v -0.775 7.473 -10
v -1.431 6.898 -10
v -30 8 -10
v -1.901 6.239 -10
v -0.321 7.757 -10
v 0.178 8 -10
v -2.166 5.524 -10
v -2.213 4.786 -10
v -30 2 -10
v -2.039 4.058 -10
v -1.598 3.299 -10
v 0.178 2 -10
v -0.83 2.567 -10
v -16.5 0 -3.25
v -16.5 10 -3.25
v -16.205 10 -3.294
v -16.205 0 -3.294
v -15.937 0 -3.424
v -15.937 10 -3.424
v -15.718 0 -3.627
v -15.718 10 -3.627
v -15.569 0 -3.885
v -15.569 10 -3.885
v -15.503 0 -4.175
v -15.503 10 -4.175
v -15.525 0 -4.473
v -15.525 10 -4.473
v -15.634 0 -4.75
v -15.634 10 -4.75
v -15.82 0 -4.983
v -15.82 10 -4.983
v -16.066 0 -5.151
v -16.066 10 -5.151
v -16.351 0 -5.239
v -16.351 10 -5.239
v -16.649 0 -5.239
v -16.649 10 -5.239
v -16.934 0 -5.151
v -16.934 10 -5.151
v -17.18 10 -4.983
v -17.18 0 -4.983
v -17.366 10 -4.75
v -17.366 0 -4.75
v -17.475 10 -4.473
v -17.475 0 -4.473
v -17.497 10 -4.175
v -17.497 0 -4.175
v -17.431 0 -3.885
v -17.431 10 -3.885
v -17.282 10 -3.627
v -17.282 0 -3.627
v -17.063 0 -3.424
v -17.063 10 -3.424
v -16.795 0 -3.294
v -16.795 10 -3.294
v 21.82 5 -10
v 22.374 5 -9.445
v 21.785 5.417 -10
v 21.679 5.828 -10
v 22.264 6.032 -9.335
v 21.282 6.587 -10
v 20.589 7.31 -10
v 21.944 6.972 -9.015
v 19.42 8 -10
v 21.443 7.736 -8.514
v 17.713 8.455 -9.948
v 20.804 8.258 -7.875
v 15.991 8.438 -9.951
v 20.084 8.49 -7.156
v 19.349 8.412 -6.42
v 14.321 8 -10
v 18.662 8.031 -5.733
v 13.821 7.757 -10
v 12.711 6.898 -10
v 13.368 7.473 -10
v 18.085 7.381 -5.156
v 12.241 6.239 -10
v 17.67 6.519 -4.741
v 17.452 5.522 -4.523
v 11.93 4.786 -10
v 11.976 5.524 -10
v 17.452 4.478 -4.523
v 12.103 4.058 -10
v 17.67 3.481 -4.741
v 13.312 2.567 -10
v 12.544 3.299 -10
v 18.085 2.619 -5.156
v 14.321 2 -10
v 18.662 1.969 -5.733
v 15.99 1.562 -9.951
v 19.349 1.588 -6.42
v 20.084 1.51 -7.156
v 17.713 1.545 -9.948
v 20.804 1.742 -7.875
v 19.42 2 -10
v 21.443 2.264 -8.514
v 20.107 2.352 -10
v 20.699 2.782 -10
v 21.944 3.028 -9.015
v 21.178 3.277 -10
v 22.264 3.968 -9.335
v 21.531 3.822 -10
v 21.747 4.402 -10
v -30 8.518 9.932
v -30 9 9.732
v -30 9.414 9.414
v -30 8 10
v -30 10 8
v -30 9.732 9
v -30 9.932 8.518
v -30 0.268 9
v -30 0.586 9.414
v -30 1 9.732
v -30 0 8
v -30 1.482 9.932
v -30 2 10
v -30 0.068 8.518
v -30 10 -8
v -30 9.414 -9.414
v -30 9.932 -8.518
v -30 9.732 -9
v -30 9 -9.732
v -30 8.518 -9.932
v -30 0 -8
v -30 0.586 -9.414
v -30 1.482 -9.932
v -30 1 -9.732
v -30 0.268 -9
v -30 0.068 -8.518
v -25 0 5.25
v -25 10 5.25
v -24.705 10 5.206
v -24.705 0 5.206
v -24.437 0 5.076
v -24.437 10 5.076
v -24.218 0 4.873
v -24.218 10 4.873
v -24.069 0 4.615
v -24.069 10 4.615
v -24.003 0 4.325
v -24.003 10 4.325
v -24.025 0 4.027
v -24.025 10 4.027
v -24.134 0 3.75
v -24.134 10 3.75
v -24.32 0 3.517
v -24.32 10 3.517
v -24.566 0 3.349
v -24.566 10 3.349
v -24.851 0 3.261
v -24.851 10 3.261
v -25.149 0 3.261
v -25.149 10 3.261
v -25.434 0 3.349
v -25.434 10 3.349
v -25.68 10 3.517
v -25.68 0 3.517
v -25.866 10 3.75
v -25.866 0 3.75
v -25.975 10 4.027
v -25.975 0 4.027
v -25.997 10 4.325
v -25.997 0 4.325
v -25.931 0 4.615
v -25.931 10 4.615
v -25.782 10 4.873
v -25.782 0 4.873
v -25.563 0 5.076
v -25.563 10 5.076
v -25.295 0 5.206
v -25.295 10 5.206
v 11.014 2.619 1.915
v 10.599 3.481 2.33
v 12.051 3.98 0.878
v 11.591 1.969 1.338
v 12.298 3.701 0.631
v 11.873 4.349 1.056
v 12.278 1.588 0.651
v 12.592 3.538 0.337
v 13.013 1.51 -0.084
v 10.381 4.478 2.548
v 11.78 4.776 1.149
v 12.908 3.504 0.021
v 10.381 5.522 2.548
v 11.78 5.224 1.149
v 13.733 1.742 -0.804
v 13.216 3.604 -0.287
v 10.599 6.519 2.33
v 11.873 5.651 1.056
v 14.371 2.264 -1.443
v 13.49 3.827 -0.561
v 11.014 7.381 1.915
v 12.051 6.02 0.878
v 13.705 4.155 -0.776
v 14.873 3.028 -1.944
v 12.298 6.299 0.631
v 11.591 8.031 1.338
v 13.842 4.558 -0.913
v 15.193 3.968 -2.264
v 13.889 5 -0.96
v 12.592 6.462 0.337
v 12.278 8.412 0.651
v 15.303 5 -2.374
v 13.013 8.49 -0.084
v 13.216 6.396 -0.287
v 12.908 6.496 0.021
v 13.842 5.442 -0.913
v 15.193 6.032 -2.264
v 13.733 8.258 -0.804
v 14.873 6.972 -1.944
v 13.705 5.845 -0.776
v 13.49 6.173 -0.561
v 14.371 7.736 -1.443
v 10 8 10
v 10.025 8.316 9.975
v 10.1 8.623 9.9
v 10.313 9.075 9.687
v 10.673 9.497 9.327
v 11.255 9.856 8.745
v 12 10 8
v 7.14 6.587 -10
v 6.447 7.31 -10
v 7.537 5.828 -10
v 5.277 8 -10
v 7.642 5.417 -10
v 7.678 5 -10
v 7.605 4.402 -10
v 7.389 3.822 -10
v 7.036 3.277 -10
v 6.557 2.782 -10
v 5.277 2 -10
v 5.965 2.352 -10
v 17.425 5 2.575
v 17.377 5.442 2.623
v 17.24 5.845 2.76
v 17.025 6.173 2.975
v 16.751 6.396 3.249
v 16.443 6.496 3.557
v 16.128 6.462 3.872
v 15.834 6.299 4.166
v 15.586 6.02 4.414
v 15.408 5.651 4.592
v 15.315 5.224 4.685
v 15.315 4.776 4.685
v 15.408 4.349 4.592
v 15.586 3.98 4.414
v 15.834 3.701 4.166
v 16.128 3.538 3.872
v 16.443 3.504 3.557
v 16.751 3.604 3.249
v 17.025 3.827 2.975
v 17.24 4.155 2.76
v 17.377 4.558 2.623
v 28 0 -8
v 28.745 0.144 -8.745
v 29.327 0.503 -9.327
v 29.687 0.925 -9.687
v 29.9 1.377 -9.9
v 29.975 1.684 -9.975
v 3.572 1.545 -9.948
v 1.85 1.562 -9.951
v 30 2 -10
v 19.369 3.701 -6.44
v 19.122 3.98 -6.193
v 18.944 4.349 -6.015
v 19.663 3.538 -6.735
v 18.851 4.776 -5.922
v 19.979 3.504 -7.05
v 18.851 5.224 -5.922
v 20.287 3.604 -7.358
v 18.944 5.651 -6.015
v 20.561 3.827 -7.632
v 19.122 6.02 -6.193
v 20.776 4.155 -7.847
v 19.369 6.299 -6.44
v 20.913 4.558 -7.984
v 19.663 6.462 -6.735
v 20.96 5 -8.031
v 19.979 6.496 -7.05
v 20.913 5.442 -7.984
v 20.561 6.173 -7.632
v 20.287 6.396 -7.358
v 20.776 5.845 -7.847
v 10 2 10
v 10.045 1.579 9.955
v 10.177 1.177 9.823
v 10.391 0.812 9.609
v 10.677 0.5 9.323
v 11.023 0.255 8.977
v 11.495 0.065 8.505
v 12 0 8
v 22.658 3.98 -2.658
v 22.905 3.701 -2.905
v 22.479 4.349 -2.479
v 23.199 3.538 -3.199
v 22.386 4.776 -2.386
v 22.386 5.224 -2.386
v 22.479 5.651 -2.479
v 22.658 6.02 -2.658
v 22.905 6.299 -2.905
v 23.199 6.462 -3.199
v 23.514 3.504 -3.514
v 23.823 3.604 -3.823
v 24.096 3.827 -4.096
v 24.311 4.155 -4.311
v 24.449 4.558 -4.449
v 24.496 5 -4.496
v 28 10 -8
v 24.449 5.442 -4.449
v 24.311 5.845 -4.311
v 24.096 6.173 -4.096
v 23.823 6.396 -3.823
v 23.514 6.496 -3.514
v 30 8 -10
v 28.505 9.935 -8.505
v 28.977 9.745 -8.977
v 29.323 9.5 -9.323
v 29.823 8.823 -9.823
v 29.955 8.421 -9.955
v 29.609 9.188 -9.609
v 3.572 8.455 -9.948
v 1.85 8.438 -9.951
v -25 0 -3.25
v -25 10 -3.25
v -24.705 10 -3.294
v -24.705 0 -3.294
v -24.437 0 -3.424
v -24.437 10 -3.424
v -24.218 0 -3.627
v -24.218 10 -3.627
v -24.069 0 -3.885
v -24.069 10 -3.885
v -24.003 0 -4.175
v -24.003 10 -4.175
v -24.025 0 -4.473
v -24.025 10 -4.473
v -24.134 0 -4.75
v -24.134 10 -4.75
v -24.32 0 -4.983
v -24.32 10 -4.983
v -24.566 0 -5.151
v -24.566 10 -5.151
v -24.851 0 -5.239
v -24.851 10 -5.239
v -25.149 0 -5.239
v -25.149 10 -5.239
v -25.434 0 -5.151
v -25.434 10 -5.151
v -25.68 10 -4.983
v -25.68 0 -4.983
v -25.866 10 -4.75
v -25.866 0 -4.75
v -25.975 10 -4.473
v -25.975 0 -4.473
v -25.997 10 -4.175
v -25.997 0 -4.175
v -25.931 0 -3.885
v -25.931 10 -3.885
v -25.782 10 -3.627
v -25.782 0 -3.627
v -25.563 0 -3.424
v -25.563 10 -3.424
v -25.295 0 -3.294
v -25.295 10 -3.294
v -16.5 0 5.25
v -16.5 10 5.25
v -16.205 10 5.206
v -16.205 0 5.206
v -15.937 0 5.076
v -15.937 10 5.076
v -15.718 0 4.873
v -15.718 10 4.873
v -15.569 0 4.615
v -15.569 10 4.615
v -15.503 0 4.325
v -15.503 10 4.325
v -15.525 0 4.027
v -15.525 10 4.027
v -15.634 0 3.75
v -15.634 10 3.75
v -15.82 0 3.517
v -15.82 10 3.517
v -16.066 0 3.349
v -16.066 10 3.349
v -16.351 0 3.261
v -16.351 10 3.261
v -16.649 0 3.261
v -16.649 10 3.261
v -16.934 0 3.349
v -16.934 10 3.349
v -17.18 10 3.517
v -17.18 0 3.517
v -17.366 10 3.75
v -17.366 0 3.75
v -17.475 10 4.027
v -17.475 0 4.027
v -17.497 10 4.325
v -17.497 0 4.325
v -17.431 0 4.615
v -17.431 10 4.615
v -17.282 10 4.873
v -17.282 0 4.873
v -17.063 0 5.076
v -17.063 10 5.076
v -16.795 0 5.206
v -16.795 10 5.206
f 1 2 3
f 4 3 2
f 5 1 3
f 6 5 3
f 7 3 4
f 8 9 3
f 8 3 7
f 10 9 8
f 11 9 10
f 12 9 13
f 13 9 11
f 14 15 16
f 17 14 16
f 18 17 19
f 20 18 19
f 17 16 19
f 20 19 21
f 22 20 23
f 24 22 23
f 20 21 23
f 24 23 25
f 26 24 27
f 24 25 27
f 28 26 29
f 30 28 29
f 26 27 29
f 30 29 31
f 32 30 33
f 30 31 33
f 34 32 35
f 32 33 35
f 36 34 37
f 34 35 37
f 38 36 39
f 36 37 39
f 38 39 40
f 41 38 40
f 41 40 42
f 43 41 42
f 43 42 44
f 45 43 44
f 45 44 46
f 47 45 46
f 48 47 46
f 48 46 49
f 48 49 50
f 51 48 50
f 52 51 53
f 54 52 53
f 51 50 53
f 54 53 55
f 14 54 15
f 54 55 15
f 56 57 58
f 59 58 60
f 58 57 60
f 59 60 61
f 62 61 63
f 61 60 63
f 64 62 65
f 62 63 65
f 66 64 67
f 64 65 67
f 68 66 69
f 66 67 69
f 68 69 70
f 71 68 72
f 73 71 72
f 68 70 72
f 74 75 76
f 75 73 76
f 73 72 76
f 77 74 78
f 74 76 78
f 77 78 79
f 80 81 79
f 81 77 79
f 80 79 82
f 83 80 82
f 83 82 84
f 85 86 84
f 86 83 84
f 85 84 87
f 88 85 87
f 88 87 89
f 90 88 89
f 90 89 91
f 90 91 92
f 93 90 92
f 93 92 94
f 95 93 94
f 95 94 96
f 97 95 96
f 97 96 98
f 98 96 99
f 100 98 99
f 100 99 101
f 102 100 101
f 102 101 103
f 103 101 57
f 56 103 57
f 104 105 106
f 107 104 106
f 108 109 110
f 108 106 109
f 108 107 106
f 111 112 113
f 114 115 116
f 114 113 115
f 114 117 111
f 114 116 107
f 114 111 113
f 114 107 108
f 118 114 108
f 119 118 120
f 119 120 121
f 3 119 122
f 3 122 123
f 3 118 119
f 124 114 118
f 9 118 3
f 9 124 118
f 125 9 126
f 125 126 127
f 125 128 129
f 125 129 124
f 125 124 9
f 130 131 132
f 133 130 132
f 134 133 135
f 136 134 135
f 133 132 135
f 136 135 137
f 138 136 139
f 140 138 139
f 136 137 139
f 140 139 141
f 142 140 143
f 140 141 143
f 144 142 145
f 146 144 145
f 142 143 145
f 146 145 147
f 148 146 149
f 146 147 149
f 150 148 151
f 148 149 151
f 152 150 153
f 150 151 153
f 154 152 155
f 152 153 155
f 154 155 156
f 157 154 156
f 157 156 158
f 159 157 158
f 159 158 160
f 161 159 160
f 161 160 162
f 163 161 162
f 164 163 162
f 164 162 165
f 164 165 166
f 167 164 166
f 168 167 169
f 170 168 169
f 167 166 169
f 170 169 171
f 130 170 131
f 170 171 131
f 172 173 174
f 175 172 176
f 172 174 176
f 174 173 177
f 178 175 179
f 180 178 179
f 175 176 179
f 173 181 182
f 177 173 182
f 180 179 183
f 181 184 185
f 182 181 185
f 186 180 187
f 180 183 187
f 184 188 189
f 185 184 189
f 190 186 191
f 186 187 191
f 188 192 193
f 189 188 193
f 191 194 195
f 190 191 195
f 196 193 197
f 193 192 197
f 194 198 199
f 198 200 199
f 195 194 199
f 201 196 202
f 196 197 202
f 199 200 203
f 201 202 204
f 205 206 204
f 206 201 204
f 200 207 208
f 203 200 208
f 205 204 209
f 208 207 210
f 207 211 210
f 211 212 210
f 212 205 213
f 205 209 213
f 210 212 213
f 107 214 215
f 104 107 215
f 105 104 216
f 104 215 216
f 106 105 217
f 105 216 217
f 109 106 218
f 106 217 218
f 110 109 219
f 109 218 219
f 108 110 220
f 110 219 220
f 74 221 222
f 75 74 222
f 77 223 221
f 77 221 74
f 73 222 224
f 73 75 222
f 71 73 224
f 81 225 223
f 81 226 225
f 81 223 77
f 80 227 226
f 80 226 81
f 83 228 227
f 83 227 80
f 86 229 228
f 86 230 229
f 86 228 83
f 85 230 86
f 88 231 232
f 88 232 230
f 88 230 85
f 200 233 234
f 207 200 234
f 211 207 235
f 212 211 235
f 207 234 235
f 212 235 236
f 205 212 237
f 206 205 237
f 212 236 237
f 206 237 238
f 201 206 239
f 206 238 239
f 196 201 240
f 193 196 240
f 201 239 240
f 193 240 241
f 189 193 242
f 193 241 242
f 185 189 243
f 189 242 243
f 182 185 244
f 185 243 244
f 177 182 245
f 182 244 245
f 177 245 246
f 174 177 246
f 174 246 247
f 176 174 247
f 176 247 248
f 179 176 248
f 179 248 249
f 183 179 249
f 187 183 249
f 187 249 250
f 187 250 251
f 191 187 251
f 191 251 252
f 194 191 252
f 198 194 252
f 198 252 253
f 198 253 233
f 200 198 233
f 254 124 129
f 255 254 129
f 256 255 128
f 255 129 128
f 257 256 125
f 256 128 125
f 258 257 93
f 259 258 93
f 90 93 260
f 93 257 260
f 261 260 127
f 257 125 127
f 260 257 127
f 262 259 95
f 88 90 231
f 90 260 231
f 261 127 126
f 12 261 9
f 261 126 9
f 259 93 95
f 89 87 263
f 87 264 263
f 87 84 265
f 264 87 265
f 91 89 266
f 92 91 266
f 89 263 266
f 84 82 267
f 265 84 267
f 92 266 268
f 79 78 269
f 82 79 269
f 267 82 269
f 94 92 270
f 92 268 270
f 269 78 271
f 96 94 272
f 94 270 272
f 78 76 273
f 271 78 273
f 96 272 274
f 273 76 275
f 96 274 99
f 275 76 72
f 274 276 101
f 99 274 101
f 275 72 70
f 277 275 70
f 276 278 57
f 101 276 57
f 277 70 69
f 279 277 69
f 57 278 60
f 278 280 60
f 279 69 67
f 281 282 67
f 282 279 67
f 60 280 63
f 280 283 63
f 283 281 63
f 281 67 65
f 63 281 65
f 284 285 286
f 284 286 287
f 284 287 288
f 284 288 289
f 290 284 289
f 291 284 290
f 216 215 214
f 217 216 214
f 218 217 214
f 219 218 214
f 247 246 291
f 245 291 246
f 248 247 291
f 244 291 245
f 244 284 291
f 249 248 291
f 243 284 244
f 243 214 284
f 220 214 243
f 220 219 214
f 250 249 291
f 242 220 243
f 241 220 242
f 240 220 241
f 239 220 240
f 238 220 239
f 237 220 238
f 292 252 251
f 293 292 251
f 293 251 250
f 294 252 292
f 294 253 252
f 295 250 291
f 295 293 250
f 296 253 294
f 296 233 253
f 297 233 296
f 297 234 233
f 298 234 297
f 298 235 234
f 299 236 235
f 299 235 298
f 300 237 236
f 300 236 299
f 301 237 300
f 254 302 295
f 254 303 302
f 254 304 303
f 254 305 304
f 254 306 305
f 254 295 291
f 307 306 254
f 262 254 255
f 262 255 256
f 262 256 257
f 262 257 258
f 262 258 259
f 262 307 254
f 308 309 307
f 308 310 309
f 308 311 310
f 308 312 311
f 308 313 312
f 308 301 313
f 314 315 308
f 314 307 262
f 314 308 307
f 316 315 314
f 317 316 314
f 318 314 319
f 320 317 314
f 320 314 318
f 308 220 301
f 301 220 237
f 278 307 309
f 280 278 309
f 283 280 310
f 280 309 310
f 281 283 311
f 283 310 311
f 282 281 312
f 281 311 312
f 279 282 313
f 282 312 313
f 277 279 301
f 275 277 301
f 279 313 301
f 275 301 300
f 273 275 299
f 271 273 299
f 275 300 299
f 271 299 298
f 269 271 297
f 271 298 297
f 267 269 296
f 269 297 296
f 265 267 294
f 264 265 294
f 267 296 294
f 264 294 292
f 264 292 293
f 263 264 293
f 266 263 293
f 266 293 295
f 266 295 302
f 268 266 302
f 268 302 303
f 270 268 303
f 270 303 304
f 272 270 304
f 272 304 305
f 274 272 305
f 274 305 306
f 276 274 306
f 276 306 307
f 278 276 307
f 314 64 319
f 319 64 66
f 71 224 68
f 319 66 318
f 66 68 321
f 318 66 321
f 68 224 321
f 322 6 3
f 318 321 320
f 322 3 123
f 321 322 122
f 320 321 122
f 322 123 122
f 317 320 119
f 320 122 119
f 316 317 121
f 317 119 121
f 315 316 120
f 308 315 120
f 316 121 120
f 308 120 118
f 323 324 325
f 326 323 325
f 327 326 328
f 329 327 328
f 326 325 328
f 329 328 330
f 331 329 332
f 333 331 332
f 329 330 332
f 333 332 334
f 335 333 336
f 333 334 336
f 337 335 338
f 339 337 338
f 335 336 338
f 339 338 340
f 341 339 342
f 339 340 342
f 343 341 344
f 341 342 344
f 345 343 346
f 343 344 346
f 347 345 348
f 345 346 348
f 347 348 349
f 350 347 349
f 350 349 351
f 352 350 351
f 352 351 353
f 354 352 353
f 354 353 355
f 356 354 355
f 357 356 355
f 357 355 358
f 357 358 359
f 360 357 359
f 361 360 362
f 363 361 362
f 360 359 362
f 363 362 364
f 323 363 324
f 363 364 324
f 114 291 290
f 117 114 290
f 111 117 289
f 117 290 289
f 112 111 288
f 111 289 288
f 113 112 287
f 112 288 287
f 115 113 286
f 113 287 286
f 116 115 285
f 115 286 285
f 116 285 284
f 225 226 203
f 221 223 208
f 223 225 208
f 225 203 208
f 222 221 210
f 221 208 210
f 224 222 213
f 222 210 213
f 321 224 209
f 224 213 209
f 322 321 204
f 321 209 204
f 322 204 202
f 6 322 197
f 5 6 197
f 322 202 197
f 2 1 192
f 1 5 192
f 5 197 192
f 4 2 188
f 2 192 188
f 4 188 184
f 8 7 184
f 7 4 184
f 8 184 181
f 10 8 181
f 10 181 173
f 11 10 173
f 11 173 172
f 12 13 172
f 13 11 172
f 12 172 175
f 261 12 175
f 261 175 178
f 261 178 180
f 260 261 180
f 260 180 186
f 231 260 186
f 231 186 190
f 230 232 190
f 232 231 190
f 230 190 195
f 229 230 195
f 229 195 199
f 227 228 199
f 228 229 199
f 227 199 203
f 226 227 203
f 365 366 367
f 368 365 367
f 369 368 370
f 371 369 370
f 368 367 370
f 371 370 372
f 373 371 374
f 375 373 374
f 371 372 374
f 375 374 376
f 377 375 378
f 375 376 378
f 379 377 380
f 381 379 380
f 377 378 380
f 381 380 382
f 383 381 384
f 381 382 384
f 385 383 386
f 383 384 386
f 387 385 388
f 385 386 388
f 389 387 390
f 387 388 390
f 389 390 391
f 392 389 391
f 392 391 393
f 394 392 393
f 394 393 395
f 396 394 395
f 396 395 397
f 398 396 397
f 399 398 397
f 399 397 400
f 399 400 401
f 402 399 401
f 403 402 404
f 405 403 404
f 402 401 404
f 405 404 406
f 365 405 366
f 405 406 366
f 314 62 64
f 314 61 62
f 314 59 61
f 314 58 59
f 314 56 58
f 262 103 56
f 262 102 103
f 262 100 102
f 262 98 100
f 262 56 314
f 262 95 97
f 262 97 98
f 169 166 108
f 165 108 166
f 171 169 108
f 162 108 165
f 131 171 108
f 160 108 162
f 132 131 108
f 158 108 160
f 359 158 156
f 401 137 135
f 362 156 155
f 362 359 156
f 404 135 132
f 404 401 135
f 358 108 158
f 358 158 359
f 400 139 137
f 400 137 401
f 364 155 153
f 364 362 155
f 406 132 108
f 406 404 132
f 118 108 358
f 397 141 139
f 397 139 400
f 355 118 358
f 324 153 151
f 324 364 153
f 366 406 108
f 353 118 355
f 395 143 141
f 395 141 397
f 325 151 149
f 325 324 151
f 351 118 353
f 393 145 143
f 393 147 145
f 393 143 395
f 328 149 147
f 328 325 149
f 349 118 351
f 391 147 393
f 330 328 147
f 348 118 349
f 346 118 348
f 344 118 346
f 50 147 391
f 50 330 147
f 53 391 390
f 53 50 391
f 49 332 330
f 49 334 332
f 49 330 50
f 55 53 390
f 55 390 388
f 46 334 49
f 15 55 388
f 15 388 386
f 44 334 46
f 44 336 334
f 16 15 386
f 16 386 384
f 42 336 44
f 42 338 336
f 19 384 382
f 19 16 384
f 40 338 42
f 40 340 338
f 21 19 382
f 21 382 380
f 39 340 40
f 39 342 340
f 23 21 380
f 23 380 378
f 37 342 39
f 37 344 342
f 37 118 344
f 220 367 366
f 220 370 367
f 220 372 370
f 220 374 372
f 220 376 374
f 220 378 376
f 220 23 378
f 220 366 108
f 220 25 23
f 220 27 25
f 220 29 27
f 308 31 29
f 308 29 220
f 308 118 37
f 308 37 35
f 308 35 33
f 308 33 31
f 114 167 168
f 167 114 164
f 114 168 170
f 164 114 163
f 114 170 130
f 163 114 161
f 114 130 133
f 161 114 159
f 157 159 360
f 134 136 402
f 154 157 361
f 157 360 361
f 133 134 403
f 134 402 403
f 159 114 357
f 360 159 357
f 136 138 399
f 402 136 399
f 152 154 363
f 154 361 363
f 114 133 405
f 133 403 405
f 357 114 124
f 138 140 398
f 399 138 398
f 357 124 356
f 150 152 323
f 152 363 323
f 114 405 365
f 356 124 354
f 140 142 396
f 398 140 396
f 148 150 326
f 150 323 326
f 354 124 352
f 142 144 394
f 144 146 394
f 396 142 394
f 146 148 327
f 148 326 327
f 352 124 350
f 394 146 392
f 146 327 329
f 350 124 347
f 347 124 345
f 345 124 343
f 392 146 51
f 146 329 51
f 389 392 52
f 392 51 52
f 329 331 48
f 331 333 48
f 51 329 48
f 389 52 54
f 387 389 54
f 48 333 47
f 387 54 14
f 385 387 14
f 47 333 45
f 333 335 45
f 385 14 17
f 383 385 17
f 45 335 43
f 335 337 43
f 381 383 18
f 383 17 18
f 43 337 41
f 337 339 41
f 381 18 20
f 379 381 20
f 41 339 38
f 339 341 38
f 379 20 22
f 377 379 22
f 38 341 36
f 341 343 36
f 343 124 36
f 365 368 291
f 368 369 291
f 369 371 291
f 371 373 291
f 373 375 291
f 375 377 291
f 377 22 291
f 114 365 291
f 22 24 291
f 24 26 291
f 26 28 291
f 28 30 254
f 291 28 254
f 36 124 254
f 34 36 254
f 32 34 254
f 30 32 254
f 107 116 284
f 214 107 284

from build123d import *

# Parameters (mm, degrees)
SKETCH1_W           = 60
SKETCH1_H           = 20
BOSS_EXTRUDE1_DEPTH = 10
SKETCH2_R           = 1
CUT_EXTRUDE1_DEPTH  = 10
CUT_EXTRUDE4_DEPTH  = 34.166247904
SKETCH6_R           = 1.5
CUT_EXTRUDE5_DEPTH  = 46.82575695
CUT_EXTRUDE6_START  = -5
SKETCH7_R           = 3.5
CUT_EXTRUDE6_DEPTH  = 41.82575695
FILLET2_R           = 2


with BuildPart() as part:
    # Sketch1 → Boss-Extrude1 (new body)
    with BuildSketch(Plane(origin=(0, 0, 0), x_dir=(1, 0, 0), z_dir=(0, 1, 0))):
        Rectangle(SKETCH1_W, SKETCH1_H)
    extrude(amount=BOSS_EXTRUDE1_DEPTH)

    # Sketch2 → Cut-Extrude1 (cut)
    with BuildSketch(Plane(origin=(0, 10, 0), x_dir=(1, 0, 0), z_dir=(0, 1, 0))):
        with Locations(Location((-25, 4.25, 0), (0, 0, 270))):
            Circle(SKETCH2_R)
        with Locations(Location((-16.5, 4.25, 0), (0, 0, 270))):
            Circle(SKETCH2_R)
        with Locations(Location((-16.5, -4.25, 0), (0, 0, 270))):
            Circle(SKETCH2_R)
        with Locations(Location((-25, -4.25, 0), (0, 0, 270))):
            Circle(SKETCH2_R)
    extrude(amount=-CUT_EXTRUDE1_DEPTH, mode=Mode.SUBTRACT)

    # Sketch5 → Cut-Extrude4 (cut, through all)
    with BuildSketch(Plane(origin=(0, 10, 0), x_dir=(1, 0, 0), z_dir=(0, 1, 0))):
        Polygon((10, -10), (30, 10), (30, -10), align=None)
    extrude(amount=-CUT_EXTRUDE4_DEPTH, mode=Mode.SUBTRACT)

    # Sketch6 → Cut-Extrude5 (cut, through all)
    with BuildSketch(Plane(origin=(10, 0, 10), x_dir=(0.7071067811865487, 0, -0.7071067811865464), z_dir=(0.7071067811865464, 0, 0.7071067811865487))):
        with Locations((19, 5)):
            Circle(SKETCH6_R)
        with Locations((9, 5)):
            Circle(SKETCH6_R)
    extrude(amount=-CUT_EXTRUDE5_DEPTH, mode=Mode.SUBTRACT)

    # Sketch7 → Cut-Extrude6 (cut, through all)
    with BuildSketch(Plane(origin=(10, 0, 10), x_dir=(0.7071067811865487, 0, -0.7071067811865464), z_dir=(0.7071067811865464, 0, 0.7071067811865487)).offset(CUT_EXTRUDE6_START)):
        with Locations((19, 5)):
            Circle(SKETCH7_R)
        with Locations((9, 5)):
            Circle(SKETCH7_R)
    extrude(amount=-CUT_EXTRUDE6_DEPTH, mode=Mode.SUBTRACT)

    # Fillet2
    # the kernel refuses this fillet: 2 mm, written as the material it takes off along each edge
    with BuildSketch(Plane(origin=(15, 10, 10), x_dir=(0, -1, 0), z_dir=(-1, 0, 0))) as fillet2_piece_1:
        with BuildLine():
            CenterArc((FILLET2_R, -FILLET2_R), FILLET2_R, 90, 90)
            Line((0, -FILLET2_R), (0, 0))
            Line((0, 0), (FILLET2_R, 0))
        make_face()
    extrude(amount=50, mode=Mode.SUBTRACT)
    with BuildSketch(Plane(origin=(15, 0, 10), x_dir=(0, 1, 0), z_dir=(-1, 0, 0))) as fillet2_piece_2:
        with BuildLine():
            CenterArc((FILLET2_R, FILLET2_R), FILLET2_R, 180, 90)
            Line((0, FILLET2_R), (0, 0))
            Line((0, 0), (FILLET2_R, 0))
        make_face()
    extrude(amount=50, mode=Mode.SUBTRACT)
    with BuildSketch(Plane(origin=(-35, 0, -10), x_dir=(0, 0, 1), z_dir=(1, 0, 0))) as fillet2_piece_3:
        with BuildLine():
            CenterArc((FILLET2_R, -FILLET2_R), FILLET2_R, 90, 90)
            Line((0, -FILLET2_R), (0, 0))
            Line((0, 0), (FILLET2_R, 0))
        make_face()
    extrude(amount=70, mode=Mode.SUBTRACT)
    with BuildSketch(Plane(origin=(-35, 10, -10), x_dir=(0, 0, 1), z_dir=(1, 0, 0))) as fillet2_piece_4:
        with BuildLine():
            CenterArc((FILLET2_R, FILLET2_R), FILLET2_R, 180, 90)
            Line((0, FILLET2_R), (0, 0))
            Line((0, 0), (FILLET2_R, 0))
        make_face()
    extrude(amount=70, mode=Mode.SUBTRACT)


solid = part.part
